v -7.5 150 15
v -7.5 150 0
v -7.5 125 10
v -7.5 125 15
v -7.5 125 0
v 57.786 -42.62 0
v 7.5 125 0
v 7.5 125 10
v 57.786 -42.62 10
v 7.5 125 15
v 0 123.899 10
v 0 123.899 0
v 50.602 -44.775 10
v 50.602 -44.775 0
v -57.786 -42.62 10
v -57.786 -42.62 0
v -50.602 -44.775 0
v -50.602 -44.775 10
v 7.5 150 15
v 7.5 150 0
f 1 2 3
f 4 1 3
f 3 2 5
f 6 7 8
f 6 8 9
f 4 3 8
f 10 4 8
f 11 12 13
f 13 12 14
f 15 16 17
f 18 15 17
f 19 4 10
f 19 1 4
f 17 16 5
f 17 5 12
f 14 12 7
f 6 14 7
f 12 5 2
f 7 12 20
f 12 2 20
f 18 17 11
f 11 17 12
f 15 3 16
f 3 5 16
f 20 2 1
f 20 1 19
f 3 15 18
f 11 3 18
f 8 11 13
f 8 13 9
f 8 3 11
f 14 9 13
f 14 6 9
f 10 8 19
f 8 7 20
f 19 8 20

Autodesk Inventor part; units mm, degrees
ref_plane "YZ Plane" through (0, 0, 0) normal (1, 0, 0) x (0, 1, 0)
ref_plane "XZ Plane" through (0, 0, 0) normal (0, 1, 0) x (-1, 0, 0)
ref_plane "XY Plane" through (0, 0, 0) normal (0, 0, 1) x (1, 0, 0)
sketch "Skizze1" plane through (0, 0, 0) normal (0, 0, 1) x (1, 0, 0)
  line L0 (-75, 0) -> (75, 0) construction
  circle A0 centre (0, 0) radius 37.5 construction
  line L1 (0, 0) -> (0, 125) construction
  line L2 (0, 125) -> (0, 150) construction
  line L3 (-7.5, 150) -> (7.5, 150) construction
  line L4 (-7.5, 125) -> (7.5, 125) construction
  line L5 (-7.5, 150) -> (7.5, 150)
  line L6 (7.5, 125) -> (7.5, 150)
  line L7 (-7.5, 150) -> (-7.5, 125)
  circle A1 centre (0, 0) radius 45 construction
  line L8 (-7.5, 125) -> (-57.7859, -42.6196)
  line L9 (7.5, 125) -> (57.7859, -42.6196)
  line L10 (-50.6022, -44.7747) -> (0, 123.8992)
  line L11 (0, 123.8992) -> (50.6022, -44.7747)
  line L12 (-57.7859, -42.6196) -> (-50.6022, -44.7747)
  line L13 (57.7859, -42.6196) -> (50.6022, -44.7747)
  point P0 (-45, 0)
  point P1 (45, 0)
  dimension "d0" = 150
  dimension "d1" = 75
  dimension "d2" = 125
  dimension "d3" = 25
  dimension "d4" = 15
  dimension "d5" = 90
  dimension "d6" = 175
  dimension "d7" = 175
  dimension "d8" = 7.5
  dimension "d9" = 7.5
extrude "Extrusion1" add sketch "Skizze1" along normal blind 10
sketch "Skizze2" plane through (0, 0, 10) normal (0, 0, 1) x (1, 0, 0)
  line L0 (-7.5, 150) -> (-7.5, 125) projected
  line L1 (7.5, 150) -> (-7.5, 150) projected
  line L2 (7.5, 125) -> (7.5, 150) projected
  line L3 (-7.5, 125) -> (7.5, 125)
  point P0 (0, 0)
extrude "Extrusion2" add sketch "Skizze2" along normal blind 5
sketch "Skizze3" plane through (0, 0, 10) normal (0, 0, 1) x (1, 0, 0)
  line L0 (-75, 0) -> (75, 0) construction
  line L1 (-50.6022, -44.7747) -> (0, 123.8992) projected
  line L2 (0, 123.8992) -> (50.6022, -44.7747) projected
  point P0 (0, 0)
  point P1 (-37.1698, 0)
  point P2 (37.1698, 0)
equation "\"Biegeradius\" = Stärke"
equation "\"BreiteBiegungsfreistellung\" = Stärke"
equation "\"TiefeBiegungsfreistellung\" = 0.5 * Stärke"
equation "\"GrößeEckenfreistellung\" = 4 * Stärke"
equation "\"MinimalRest\" = 2 * Stärke"
equation "\"Übergangsradius\" = Biegeradius"
equation "\"JacobiRadiusGröße\" = Biegeradius"
equation "\"Abstandsgröße\" = Stärke"
equation "\"Stärke\" = 0.5"
properties part number "deichsel"
